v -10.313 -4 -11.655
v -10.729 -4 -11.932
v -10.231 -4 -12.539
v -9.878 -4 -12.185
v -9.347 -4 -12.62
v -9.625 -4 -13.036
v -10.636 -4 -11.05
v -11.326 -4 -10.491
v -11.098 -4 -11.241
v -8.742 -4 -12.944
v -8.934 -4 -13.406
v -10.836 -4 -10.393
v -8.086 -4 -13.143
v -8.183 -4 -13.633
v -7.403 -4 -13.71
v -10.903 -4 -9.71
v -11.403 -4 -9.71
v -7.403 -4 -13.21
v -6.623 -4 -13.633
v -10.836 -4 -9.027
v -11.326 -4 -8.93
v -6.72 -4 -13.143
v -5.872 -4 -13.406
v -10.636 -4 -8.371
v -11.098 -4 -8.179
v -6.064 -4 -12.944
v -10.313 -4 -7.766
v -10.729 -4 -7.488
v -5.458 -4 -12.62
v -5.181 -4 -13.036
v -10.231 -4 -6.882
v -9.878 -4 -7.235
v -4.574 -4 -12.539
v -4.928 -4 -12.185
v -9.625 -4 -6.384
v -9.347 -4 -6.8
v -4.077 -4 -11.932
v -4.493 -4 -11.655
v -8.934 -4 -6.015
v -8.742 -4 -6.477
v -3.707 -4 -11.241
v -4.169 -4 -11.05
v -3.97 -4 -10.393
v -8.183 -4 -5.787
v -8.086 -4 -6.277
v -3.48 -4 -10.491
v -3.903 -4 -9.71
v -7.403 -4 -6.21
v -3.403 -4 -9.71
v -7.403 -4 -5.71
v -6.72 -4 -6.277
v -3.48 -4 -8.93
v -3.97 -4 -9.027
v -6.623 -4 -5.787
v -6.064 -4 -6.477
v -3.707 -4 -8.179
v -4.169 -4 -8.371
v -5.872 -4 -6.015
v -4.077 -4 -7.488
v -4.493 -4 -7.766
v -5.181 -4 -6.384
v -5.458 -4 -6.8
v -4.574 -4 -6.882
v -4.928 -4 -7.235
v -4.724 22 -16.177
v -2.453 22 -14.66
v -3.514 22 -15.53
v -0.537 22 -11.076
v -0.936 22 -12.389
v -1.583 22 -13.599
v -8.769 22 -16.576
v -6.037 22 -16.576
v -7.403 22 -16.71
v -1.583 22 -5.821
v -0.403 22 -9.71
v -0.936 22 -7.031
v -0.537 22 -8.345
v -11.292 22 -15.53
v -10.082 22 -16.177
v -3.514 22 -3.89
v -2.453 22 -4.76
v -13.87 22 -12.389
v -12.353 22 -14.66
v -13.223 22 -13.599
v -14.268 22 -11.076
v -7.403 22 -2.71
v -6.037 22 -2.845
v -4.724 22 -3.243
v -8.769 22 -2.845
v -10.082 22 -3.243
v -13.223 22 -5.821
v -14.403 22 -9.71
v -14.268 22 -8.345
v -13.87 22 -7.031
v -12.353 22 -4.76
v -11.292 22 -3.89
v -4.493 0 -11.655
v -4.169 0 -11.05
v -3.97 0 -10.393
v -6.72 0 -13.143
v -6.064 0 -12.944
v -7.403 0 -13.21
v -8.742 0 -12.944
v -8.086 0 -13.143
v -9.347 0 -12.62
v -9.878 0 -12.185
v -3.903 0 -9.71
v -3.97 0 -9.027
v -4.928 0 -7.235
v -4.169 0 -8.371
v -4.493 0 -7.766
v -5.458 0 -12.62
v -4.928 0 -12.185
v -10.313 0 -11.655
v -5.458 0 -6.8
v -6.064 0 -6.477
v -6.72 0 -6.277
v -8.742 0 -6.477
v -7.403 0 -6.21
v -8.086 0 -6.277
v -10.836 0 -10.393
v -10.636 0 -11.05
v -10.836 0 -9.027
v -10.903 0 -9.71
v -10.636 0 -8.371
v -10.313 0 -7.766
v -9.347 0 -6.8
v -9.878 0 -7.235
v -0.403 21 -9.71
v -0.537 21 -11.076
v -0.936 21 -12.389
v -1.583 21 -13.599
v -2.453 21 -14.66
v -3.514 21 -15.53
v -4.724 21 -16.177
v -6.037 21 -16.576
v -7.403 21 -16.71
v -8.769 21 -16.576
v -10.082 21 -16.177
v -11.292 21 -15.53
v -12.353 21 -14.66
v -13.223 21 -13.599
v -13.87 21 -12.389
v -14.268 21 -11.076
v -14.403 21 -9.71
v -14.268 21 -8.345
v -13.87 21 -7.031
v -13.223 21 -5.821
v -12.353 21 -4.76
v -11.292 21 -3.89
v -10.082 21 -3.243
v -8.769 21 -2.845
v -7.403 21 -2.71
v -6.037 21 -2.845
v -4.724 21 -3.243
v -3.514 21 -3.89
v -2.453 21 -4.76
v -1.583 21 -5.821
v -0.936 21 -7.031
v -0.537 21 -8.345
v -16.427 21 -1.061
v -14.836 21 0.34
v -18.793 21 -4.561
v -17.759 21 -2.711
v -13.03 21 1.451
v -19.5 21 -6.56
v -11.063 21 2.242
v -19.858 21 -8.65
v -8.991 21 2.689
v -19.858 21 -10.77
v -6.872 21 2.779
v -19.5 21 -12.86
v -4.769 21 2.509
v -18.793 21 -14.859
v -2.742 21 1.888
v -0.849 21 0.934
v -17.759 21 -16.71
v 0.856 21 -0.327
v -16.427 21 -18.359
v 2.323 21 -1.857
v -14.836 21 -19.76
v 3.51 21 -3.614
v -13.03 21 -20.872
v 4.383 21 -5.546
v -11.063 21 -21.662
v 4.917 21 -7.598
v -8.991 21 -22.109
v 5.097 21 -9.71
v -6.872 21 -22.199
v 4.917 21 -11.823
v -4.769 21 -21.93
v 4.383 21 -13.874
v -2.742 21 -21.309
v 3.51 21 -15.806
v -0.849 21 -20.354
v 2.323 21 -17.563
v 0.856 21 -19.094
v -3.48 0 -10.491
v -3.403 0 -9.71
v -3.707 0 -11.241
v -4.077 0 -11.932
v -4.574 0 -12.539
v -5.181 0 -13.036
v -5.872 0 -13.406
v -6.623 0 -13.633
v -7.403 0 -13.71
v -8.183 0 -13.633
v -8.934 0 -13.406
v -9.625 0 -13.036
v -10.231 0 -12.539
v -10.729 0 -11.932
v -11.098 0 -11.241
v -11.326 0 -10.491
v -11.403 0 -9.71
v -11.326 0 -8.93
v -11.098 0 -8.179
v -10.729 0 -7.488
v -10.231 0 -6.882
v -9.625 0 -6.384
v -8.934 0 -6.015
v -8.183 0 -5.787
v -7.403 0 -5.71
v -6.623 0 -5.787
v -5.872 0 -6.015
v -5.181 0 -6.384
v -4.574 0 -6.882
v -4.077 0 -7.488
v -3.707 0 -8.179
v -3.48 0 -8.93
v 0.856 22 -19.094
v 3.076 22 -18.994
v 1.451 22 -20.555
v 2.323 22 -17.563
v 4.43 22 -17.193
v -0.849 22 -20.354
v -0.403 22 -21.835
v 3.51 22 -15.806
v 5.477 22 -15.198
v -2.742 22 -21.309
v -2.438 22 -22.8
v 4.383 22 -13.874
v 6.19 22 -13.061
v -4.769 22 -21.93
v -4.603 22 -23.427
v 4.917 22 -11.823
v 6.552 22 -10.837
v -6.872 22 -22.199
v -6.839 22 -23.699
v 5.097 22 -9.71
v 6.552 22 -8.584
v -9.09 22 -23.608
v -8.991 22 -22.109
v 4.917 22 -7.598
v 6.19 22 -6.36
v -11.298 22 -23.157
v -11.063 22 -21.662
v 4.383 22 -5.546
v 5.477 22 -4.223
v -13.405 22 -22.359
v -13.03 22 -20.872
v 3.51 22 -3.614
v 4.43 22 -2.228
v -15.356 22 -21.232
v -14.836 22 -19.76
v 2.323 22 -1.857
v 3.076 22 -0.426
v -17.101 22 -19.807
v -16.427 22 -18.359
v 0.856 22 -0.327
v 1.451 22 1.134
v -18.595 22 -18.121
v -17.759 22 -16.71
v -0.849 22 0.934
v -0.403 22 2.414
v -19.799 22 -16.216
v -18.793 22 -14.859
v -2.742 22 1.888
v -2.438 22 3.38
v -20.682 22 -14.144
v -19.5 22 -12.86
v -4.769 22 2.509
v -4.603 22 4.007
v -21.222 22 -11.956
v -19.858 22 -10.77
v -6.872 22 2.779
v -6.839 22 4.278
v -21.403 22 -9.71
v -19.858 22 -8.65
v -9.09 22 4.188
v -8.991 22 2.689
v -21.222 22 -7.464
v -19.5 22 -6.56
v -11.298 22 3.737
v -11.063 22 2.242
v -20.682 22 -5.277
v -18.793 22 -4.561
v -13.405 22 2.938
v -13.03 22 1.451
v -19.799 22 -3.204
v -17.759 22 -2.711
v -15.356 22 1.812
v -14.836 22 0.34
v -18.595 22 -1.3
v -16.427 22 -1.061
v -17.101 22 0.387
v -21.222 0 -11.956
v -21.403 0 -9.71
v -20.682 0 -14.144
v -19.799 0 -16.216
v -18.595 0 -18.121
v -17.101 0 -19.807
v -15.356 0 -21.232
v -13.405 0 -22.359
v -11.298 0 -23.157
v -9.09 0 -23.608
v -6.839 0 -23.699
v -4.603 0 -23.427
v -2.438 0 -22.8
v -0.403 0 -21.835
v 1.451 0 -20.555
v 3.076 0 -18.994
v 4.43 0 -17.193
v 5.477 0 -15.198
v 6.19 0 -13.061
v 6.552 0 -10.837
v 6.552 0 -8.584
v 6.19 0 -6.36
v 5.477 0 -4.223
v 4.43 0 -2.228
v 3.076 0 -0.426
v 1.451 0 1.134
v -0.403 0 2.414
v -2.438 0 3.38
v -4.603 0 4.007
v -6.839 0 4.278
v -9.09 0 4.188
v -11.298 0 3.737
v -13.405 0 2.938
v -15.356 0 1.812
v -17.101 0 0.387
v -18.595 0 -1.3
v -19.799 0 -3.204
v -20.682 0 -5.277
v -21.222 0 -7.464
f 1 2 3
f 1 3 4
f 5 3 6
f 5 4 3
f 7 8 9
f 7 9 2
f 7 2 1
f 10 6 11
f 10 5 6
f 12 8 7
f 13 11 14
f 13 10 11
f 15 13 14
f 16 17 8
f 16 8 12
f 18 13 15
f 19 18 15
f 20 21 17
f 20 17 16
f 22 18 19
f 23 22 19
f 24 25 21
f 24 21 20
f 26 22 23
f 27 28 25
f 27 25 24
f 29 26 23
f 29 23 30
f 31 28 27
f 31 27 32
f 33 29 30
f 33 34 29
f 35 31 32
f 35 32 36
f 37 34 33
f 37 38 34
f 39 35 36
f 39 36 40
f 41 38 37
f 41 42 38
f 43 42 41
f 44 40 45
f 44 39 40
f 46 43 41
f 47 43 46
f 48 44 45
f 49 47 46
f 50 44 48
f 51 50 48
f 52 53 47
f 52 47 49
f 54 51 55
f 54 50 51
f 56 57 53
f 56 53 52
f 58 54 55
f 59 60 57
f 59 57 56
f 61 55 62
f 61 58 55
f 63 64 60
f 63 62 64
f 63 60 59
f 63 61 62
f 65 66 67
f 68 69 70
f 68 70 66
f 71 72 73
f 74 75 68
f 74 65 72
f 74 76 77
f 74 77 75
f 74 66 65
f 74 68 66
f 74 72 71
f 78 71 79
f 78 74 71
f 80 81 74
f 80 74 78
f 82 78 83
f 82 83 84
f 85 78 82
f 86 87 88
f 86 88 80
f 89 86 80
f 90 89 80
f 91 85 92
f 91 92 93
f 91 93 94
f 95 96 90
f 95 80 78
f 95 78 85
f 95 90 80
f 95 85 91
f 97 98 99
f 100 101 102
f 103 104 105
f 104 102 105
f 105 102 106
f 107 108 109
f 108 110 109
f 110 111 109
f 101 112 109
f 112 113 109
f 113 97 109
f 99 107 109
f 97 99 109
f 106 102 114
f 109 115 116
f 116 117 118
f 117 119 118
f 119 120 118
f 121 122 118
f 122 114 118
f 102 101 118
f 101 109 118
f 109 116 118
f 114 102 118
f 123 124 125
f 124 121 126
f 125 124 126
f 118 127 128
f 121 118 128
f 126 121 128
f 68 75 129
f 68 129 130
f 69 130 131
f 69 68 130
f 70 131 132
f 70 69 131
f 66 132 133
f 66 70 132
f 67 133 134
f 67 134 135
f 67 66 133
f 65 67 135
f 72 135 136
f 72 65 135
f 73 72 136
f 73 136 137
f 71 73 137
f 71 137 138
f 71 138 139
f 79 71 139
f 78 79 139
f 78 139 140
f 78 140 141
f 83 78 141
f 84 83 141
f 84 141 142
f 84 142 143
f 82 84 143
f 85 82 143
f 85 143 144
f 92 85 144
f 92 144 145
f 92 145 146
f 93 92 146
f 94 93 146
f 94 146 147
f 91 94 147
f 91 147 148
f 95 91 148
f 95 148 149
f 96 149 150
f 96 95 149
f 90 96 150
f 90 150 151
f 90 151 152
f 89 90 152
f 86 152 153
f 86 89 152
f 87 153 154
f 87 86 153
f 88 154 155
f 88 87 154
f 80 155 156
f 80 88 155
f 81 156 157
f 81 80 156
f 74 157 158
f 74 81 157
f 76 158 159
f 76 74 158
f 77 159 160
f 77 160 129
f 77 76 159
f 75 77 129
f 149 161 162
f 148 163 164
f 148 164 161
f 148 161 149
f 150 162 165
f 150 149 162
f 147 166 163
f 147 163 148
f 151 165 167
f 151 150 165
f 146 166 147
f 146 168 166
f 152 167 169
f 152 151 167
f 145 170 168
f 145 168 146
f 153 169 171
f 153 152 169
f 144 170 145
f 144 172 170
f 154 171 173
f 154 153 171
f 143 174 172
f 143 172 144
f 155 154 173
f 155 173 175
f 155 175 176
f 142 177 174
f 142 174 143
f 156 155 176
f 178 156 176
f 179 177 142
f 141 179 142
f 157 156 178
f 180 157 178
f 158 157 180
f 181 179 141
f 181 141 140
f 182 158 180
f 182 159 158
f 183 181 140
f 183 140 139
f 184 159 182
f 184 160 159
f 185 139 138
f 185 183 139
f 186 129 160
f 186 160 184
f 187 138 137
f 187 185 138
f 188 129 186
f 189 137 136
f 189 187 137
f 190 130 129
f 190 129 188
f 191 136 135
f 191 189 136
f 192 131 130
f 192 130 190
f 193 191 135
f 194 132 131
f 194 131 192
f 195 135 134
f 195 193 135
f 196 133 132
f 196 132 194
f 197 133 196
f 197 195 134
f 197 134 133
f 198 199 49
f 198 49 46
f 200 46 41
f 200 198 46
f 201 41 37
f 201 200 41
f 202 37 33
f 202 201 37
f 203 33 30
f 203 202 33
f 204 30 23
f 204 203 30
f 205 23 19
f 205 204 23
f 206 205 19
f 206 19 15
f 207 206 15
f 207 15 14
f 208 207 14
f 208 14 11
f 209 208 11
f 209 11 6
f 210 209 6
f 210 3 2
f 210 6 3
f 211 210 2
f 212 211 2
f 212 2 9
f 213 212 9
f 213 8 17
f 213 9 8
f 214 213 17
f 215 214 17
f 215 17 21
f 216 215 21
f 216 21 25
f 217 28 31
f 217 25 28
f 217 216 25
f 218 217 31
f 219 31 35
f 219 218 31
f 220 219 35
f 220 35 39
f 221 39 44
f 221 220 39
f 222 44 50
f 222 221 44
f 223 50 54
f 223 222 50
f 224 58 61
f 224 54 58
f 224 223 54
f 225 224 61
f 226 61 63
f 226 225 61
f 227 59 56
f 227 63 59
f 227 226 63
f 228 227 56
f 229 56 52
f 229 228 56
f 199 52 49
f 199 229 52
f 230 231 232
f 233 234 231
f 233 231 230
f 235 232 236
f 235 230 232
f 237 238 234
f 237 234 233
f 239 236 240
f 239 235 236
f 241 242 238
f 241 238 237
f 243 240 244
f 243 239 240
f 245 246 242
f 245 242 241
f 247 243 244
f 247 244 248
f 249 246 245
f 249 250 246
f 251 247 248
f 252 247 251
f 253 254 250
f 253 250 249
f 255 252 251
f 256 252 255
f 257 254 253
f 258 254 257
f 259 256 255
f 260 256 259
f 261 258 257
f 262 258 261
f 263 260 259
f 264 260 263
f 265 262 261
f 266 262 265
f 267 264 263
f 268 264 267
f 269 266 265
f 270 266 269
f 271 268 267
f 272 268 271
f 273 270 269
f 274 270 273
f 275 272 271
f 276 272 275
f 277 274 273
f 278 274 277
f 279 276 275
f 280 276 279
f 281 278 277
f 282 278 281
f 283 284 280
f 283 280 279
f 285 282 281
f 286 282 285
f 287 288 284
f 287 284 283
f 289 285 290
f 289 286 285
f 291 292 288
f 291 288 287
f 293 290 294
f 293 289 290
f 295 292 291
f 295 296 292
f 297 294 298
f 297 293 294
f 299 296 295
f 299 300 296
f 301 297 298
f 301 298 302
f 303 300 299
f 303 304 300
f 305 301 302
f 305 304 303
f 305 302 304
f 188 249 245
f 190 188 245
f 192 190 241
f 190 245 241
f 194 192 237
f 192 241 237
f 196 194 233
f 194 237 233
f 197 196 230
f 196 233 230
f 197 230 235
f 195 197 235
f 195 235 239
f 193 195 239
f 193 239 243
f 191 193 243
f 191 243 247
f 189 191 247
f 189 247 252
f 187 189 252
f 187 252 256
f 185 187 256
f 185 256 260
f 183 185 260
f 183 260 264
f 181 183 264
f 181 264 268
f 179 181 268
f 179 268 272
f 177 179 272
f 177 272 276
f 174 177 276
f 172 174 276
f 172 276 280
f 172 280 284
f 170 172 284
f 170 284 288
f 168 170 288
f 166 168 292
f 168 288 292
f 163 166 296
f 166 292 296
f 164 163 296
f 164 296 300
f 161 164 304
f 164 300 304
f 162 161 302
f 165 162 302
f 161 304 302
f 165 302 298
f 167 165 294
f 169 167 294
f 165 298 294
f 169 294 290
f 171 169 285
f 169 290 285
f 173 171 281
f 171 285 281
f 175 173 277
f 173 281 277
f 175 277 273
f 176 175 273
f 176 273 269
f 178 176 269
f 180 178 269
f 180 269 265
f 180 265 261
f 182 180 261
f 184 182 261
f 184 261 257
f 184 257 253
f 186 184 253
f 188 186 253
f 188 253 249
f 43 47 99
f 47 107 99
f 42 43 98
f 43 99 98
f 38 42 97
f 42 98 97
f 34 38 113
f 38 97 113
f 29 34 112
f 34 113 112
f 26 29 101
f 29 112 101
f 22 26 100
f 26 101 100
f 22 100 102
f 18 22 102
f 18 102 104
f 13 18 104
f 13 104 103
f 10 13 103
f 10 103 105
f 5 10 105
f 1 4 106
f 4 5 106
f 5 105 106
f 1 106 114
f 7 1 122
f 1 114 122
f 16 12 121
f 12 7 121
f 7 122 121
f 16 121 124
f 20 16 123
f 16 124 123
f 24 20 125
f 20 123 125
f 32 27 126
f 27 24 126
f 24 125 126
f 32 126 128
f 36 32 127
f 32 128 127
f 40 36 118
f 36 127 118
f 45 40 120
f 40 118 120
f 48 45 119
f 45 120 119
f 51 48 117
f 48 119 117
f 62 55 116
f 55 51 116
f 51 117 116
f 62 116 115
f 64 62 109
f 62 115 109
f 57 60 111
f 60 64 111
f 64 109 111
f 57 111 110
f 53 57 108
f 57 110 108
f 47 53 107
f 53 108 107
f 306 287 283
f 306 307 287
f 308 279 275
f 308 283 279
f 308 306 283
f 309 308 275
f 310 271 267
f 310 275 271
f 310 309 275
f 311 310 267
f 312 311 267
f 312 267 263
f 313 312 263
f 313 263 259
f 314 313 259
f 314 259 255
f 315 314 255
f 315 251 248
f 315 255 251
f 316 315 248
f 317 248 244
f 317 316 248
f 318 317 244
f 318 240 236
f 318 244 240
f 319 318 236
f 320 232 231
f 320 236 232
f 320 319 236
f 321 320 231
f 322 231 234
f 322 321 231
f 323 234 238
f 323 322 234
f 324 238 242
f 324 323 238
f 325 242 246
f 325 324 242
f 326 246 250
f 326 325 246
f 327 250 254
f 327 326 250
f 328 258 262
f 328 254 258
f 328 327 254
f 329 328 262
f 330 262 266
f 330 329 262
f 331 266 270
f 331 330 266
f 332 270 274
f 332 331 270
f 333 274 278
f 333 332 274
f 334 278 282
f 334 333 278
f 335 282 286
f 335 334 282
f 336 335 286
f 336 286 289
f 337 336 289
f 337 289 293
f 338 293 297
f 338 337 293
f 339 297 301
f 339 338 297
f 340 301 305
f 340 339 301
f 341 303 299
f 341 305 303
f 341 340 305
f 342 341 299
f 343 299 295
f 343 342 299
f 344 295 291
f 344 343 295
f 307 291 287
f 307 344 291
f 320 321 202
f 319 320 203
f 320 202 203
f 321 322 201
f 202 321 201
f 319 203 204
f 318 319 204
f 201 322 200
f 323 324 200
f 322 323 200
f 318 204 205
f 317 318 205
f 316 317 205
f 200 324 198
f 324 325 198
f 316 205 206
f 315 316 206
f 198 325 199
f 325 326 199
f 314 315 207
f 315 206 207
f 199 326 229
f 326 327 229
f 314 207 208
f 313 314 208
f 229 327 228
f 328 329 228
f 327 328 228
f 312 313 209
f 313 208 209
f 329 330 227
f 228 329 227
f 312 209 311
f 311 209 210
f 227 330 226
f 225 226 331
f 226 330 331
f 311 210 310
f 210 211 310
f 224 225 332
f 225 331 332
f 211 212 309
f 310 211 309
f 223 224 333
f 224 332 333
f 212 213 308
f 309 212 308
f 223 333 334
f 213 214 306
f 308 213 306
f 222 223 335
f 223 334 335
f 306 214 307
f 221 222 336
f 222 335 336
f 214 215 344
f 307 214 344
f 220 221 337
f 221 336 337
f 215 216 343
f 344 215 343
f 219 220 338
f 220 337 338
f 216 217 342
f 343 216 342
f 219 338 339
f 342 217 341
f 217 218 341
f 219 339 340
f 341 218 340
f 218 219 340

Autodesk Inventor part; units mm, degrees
ref_plane "YZ Plane" through (0, 0, 0) normal (1, 0, 0) x (0, 1, 0)
ref_plane "XZ Plane" through (0, 0, 0) normal (0, 1, 0) x (-1, 0, 0)
ref_plane "XY Plane" through (0, 0, 0) normal (0, 0, 1) x (1, 0, 0)
sketch "Эскиз1" plane through (0, 0, 0) normal (0, 1, 0) x (-1, 0, 0)
  circle A0 centre (7.4029, -9.7102) radius 14
  point P0 (0, 0)
  dimension "d0" = 28
extrude "Выдавливание1" add sketch "Эскиз1" along normal blind 22
sketch "Эскиз2" plane through (-7.4029, 22, -9.7102) normal (0, 1, 0) x (1, 0, 0)
  circle A0 centre (0, 0) radius 12.5
  circle A1 centre (0, 0) radius 7
  point P0 (7.4029, -9.7102)
  dimension "d6" = 25
  dimension "d7" = 14
extrude "Выдавливание2" cut sketch "Эскиз2" against normal blind 1
sketch "Эскиз3" plane through (-7.4029, 0, -9.7102) normal (0, -1, 0) x (1, 0, 0)
  circle A0 centre (0, 0) radius 4
  circle A1 centre (0, 0) radius 3.5
  point P0 (7.4029, 9.7102)
  dimension "d8" = 8
  dimension "d9" = 7
extrude "Выдавливание3" add sketch "Эскиз3" along normal blind 4
properties part number "магнит" material "Титан"
